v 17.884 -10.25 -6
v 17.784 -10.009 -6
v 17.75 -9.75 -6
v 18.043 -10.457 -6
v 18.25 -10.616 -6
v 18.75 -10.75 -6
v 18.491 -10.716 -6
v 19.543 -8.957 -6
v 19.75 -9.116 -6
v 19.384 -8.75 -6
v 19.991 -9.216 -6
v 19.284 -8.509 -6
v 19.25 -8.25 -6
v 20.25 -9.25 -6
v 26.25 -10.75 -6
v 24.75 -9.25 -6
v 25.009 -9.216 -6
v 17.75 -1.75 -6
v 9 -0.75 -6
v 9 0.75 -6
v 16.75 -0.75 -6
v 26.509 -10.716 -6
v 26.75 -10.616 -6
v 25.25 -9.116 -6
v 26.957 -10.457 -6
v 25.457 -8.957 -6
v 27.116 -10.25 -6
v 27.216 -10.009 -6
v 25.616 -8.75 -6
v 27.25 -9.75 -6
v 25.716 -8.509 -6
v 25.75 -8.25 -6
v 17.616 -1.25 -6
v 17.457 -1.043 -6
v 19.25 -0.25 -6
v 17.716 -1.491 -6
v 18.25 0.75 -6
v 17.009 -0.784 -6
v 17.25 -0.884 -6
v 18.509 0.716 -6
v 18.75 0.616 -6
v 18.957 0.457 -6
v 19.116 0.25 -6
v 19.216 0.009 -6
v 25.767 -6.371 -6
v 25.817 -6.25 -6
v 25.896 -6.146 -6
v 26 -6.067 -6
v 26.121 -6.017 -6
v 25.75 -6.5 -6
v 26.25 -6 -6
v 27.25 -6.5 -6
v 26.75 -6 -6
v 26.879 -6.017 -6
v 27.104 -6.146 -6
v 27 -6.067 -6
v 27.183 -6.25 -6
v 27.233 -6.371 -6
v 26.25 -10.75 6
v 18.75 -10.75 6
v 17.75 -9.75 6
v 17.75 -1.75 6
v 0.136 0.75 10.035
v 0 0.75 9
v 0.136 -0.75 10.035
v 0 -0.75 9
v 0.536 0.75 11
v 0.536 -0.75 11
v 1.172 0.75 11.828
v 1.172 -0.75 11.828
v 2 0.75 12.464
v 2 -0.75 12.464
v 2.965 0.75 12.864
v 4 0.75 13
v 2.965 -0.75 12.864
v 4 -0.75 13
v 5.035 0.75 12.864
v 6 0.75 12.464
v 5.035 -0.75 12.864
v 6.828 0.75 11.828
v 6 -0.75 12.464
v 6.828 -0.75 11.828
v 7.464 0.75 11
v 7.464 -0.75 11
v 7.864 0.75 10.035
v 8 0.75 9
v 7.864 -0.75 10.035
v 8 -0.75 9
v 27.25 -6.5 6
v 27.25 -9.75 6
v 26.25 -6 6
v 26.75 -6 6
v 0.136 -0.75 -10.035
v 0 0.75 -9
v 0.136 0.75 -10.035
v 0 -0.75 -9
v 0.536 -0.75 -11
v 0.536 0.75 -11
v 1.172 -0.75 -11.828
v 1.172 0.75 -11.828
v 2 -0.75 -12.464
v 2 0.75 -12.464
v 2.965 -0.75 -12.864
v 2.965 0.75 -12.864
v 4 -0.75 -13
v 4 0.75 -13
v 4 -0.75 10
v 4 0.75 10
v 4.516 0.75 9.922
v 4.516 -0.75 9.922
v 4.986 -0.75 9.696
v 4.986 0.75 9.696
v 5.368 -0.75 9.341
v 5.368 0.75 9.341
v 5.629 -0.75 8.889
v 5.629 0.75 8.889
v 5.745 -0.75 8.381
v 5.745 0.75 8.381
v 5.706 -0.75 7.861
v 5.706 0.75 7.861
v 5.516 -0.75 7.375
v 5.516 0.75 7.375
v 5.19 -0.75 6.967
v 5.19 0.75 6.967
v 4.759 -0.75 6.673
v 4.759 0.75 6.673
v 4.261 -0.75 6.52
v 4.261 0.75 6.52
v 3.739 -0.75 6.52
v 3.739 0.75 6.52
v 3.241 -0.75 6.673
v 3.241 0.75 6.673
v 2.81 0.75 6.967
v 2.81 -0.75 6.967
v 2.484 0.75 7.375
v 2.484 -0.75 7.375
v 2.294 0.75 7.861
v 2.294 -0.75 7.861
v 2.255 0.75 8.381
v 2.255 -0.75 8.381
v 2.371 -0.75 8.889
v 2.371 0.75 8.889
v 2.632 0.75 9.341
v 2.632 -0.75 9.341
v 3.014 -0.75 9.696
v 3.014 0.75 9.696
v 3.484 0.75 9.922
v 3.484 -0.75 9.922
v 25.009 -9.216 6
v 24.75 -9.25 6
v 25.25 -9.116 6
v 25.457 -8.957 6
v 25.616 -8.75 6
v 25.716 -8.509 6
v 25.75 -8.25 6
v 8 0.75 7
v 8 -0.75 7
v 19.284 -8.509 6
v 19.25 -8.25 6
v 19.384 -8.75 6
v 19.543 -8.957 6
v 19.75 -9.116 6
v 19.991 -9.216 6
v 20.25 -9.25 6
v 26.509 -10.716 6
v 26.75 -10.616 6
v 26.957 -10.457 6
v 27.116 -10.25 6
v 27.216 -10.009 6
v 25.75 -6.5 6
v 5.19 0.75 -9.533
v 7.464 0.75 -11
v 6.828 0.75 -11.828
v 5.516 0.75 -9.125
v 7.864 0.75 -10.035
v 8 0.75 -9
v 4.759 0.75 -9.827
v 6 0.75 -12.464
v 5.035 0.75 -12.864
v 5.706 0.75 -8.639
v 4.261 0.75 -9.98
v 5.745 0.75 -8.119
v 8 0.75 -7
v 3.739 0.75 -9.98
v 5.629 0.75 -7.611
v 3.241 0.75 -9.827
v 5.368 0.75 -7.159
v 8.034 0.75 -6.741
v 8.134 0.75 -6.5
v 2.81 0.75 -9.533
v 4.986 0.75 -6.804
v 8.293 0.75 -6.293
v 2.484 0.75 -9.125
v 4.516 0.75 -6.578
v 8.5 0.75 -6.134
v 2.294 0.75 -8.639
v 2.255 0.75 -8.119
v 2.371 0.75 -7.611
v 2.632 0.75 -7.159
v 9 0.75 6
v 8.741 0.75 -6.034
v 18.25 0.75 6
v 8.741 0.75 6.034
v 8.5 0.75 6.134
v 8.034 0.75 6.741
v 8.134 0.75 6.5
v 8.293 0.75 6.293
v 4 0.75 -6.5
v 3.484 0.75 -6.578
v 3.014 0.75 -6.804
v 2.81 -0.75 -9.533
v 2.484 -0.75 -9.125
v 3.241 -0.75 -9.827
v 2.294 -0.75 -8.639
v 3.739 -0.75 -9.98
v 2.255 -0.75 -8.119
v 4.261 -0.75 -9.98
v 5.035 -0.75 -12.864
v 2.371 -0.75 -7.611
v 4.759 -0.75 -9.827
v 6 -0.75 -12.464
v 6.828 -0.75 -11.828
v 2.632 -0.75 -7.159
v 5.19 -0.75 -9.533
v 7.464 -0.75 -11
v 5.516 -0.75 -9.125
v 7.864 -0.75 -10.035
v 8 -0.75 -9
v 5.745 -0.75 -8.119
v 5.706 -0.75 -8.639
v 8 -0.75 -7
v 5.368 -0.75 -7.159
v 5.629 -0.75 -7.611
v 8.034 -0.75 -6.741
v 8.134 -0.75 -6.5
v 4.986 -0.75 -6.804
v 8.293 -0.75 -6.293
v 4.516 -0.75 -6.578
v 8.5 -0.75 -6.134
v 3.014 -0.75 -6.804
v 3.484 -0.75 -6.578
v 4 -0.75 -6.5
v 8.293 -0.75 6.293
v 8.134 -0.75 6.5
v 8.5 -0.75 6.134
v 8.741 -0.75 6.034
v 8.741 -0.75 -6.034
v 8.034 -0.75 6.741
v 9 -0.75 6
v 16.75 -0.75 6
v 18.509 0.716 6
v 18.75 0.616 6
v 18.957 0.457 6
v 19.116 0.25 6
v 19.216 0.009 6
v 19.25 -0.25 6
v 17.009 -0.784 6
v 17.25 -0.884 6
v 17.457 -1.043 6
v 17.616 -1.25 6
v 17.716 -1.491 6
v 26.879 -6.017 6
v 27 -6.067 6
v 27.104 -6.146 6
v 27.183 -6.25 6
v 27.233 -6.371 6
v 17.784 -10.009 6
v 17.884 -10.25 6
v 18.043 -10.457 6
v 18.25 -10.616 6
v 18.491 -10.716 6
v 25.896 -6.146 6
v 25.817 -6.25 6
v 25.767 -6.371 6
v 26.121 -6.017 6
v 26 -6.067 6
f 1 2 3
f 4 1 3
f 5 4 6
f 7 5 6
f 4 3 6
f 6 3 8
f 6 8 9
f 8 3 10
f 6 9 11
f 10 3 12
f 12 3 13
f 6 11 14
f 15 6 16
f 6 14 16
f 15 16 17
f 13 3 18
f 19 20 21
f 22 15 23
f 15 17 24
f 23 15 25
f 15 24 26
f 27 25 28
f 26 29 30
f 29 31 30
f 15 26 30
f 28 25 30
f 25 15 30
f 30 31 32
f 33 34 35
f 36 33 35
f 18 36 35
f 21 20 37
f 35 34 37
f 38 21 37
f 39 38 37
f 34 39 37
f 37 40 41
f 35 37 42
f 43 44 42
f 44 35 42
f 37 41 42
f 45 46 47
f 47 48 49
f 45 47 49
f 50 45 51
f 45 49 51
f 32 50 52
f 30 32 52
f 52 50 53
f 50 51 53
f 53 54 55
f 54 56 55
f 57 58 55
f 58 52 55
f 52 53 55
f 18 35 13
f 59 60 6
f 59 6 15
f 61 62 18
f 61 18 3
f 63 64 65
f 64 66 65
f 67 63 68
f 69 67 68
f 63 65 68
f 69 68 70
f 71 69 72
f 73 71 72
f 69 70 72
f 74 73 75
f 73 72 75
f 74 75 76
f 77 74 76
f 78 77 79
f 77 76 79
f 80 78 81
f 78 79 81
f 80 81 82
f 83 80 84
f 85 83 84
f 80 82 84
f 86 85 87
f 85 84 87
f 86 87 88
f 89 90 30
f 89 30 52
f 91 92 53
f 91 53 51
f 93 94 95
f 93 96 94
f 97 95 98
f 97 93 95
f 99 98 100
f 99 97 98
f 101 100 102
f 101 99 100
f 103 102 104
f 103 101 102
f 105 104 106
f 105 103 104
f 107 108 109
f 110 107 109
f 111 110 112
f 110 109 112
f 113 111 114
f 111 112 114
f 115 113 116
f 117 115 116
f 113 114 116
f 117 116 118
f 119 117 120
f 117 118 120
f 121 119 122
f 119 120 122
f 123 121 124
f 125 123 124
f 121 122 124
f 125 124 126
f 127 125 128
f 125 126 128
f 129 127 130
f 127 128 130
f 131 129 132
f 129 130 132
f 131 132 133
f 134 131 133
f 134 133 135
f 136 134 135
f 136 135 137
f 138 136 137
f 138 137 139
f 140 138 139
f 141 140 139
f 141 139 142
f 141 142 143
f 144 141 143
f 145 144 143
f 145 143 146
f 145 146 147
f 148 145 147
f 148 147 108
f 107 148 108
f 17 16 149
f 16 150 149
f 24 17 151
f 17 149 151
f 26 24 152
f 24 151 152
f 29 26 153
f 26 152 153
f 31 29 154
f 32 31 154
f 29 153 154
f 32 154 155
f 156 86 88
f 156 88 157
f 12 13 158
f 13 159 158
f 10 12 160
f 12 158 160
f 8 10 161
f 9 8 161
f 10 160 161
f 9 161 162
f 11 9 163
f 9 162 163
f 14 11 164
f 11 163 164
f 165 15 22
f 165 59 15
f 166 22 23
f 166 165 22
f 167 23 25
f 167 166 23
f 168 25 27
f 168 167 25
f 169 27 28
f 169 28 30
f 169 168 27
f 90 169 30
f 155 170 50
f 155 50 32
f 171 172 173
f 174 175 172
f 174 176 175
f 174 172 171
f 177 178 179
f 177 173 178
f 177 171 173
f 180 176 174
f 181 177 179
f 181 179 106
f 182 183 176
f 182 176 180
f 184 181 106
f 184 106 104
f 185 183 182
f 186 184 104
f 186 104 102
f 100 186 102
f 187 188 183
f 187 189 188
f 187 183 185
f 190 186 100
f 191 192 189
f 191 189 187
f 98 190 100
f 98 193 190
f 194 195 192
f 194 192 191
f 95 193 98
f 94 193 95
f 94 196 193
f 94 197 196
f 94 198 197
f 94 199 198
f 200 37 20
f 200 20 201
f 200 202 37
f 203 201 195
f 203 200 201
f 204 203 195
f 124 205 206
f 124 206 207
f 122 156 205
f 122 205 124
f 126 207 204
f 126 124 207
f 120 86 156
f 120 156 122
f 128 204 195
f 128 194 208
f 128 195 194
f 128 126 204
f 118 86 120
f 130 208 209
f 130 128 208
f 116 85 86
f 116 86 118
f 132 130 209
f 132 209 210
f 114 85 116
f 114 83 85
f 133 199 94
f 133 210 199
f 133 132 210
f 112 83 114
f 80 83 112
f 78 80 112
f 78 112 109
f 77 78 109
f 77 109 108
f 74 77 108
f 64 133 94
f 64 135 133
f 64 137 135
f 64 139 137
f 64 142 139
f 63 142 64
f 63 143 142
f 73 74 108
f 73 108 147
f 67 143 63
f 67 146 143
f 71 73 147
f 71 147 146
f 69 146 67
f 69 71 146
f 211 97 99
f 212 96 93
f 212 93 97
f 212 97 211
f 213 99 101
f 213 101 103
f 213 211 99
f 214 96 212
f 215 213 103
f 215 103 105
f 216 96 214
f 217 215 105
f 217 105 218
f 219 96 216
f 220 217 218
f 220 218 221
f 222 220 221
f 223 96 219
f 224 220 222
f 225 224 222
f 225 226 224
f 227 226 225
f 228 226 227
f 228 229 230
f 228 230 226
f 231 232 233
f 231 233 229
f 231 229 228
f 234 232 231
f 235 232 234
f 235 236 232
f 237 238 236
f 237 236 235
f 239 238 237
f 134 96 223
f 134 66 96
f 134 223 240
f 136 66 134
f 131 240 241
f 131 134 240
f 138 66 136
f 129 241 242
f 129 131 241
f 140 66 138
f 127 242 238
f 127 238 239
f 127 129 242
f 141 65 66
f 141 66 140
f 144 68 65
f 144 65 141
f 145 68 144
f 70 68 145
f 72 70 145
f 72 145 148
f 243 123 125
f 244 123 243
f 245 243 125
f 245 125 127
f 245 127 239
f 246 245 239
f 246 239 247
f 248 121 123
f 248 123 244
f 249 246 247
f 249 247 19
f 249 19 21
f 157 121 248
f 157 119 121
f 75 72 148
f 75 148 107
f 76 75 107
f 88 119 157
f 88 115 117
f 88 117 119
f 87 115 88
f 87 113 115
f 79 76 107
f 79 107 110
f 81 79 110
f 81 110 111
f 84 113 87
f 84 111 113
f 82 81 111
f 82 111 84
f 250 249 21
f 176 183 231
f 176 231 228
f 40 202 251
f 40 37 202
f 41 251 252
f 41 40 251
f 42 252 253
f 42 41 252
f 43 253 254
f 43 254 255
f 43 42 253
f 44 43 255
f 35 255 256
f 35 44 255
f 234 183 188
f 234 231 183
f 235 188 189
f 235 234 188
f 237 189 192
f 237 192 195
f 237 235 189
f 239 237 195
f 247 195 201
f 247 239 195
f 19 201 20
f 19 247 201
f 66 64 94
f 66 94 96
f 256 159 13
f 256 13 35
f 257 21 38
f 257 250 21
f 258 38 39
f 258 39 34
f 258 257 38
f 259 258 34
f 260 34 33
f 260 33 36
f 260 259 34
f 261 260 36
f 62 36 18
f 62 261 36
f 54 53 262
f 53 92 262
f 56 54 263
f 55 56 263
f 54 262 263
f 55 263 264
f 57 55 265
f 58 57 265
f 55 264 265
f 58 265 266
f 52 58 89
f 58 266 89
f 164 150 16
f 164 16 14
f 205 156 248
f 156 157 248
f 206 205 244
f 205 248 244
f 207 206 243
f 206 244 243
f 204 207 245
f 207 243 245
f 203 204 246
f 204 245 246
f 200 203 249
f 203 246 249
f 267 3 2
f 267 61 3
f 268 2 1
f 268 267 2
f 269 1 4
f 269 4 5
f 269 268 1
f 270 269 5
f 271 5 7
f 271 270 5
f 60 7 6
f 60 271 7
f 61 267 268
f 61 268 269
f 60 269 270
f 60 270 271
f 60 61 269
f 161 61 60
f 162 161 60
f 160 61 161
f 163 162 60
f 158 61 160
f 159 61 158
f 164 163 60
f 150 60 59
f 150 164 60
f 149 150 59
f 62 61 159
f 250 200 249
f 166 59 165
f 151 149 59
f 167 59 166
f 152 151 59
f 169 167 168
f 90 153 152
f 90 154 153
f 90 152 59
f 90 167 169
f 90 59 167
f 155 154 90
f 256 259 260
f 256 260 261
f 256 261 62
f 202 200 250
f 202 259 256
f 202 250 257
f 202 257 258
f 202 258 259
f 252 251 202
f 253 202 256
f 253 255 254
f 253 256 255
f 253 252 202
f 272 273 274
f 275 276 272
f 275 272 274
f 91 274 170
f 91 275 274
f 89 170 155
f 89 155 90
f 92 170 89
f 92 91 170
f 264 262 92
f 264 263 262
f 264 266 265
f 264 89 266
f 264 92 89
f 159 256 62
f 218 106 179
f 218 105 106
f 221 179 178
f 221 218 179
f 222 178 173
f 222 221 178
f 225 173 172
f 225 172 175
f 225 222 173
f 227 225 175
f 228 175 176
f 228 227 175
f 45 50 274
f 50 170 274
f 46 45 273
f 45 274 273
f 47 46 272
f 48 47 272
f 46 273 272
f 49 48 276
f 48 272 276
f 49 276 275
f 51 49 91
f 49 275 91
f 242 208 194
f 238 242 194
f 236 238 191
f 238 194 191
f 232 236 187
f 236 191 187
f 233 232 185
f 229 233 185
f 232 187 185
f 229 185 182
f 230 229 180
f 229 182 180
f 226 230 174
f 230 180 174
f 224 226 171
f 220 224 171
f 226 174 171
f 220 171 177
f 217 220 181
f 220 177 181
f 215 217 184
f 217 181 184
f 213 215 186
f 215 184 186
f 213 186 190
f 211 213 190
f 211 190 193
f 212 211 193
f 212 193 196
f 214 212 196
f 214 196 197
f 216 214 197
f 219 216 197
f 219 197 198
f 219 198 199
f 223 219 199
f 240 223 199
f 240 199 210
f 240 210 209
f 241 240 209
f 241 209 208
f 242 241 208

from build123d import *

# Parameters (mm, degrees)
EXTRUDE_1_DEPTH     = 13
SKETCH_2_W          = 19.25
SKETCH_2_H          = 7
CUT_EXTRUDE_1_DEPTH = 16
SKETCH_3_R          = 1.75
CUT_EXTRUDE_2_DEPTH = 6
FILLET_1_R          = 4
FILLET_2_R          = 1
FILLET_3_R          = 1
FILLET_4_R          = 0.5


with BuildPart() as part:
    # 草图1 → 凸台-拉伸1 (new, symmetric)
    with BuildSketch(Plane.XY):
        Polygon((0, -0.75), (17.75, -0.75), (17.75, -10.75), (27.25, -10.75), (27.25, -6), (25.75, -6), (25.75, -9.25), (19.25, -9.25), (19.25, 0.75), (0, 0.75), align=None)
    extrude(amount=EXTRUDE_1_DEPTH, both=True)

    # 草图2 → 切除-拉伸1 (cut)
    with BuildSketch(Plane(origin=(0, 0.75, 0), x_dir=(1, 0, 0), z_dir=(0, 1, 0))):
        with Locations((17.625, 9.5)):
            Rectangle(SKETCH_2_W, SKETCH_2_H)
        with Locations((17.625, -9.5)):
            Rectangle(SKETCH_2_W, SKETCH_2_H)
    extrude(amount=-CUT_EXTRUDE_1_DEPTH, mode=Mode.SUBTRACT)

    # 草图3 → 切除-拉伸2 (cut)
    with BuildSketch(Plane(origin=(0, 0.75, 0), x_dir=(1, 0, 0), z_dir=(0, 1, 0))):
        with Locations(Location((4, 8.25, 0), (0, 0, 270))):
            Circle(SKETCH_3_R)
        with Locations(Location((4, -8.25, 0), (0, 0, 270))):
            Circle(SKETCH_3_R)
    extrude(amount=-CUT_EXTRUDE_2_DEPTH, mode=Mode.SUBTRACT)

    # 圆角1
    fillet_1_edges = [part.edges().sort_by_distance(p)[0] for p in [
        (8, 0, 13),
        (0, 0, 13),
        (0, 0, -13),
        (8, 0, -13),
    ]]
    fillet(fillet_1_edges, radius=FILLET_1_R - 0.0001)  # a hair under: the kernel refuses the full size

    # 圆角2
    fillet_2_edges = [part.edges().sort_by_distance(p)[0] for p in [
        (8, 0, -6),
        (8, 0, 6),
    ]]
    fillet(fillet_2_edges, radius=FILLET_2_R)

    # 圆角3
    fillet_3_edges = [part.edges().sort_by_distance(p)[0] for p in [
        (19.25, 0.75, 0),
        (19.25, -9.25, 0),
        (25.75, -9.25, 0),
        (27.25, -10.75, 0),
        (17.75, -10.75, 0),
        (17.75, -0.75, 0),
    ]]
    fillet(fillet_3_edges, radius=FILLET_3_R)

    # 圆角4
    fillet_4_edges = [part.edges().sort_by_distance(p)[0] for p in [
        (25.75, -6, 0),
        (27.25, -6, 0),
    ]]
    fillet(fillet_4_edges, radius=FILLET_4_R)


solid = part.part
